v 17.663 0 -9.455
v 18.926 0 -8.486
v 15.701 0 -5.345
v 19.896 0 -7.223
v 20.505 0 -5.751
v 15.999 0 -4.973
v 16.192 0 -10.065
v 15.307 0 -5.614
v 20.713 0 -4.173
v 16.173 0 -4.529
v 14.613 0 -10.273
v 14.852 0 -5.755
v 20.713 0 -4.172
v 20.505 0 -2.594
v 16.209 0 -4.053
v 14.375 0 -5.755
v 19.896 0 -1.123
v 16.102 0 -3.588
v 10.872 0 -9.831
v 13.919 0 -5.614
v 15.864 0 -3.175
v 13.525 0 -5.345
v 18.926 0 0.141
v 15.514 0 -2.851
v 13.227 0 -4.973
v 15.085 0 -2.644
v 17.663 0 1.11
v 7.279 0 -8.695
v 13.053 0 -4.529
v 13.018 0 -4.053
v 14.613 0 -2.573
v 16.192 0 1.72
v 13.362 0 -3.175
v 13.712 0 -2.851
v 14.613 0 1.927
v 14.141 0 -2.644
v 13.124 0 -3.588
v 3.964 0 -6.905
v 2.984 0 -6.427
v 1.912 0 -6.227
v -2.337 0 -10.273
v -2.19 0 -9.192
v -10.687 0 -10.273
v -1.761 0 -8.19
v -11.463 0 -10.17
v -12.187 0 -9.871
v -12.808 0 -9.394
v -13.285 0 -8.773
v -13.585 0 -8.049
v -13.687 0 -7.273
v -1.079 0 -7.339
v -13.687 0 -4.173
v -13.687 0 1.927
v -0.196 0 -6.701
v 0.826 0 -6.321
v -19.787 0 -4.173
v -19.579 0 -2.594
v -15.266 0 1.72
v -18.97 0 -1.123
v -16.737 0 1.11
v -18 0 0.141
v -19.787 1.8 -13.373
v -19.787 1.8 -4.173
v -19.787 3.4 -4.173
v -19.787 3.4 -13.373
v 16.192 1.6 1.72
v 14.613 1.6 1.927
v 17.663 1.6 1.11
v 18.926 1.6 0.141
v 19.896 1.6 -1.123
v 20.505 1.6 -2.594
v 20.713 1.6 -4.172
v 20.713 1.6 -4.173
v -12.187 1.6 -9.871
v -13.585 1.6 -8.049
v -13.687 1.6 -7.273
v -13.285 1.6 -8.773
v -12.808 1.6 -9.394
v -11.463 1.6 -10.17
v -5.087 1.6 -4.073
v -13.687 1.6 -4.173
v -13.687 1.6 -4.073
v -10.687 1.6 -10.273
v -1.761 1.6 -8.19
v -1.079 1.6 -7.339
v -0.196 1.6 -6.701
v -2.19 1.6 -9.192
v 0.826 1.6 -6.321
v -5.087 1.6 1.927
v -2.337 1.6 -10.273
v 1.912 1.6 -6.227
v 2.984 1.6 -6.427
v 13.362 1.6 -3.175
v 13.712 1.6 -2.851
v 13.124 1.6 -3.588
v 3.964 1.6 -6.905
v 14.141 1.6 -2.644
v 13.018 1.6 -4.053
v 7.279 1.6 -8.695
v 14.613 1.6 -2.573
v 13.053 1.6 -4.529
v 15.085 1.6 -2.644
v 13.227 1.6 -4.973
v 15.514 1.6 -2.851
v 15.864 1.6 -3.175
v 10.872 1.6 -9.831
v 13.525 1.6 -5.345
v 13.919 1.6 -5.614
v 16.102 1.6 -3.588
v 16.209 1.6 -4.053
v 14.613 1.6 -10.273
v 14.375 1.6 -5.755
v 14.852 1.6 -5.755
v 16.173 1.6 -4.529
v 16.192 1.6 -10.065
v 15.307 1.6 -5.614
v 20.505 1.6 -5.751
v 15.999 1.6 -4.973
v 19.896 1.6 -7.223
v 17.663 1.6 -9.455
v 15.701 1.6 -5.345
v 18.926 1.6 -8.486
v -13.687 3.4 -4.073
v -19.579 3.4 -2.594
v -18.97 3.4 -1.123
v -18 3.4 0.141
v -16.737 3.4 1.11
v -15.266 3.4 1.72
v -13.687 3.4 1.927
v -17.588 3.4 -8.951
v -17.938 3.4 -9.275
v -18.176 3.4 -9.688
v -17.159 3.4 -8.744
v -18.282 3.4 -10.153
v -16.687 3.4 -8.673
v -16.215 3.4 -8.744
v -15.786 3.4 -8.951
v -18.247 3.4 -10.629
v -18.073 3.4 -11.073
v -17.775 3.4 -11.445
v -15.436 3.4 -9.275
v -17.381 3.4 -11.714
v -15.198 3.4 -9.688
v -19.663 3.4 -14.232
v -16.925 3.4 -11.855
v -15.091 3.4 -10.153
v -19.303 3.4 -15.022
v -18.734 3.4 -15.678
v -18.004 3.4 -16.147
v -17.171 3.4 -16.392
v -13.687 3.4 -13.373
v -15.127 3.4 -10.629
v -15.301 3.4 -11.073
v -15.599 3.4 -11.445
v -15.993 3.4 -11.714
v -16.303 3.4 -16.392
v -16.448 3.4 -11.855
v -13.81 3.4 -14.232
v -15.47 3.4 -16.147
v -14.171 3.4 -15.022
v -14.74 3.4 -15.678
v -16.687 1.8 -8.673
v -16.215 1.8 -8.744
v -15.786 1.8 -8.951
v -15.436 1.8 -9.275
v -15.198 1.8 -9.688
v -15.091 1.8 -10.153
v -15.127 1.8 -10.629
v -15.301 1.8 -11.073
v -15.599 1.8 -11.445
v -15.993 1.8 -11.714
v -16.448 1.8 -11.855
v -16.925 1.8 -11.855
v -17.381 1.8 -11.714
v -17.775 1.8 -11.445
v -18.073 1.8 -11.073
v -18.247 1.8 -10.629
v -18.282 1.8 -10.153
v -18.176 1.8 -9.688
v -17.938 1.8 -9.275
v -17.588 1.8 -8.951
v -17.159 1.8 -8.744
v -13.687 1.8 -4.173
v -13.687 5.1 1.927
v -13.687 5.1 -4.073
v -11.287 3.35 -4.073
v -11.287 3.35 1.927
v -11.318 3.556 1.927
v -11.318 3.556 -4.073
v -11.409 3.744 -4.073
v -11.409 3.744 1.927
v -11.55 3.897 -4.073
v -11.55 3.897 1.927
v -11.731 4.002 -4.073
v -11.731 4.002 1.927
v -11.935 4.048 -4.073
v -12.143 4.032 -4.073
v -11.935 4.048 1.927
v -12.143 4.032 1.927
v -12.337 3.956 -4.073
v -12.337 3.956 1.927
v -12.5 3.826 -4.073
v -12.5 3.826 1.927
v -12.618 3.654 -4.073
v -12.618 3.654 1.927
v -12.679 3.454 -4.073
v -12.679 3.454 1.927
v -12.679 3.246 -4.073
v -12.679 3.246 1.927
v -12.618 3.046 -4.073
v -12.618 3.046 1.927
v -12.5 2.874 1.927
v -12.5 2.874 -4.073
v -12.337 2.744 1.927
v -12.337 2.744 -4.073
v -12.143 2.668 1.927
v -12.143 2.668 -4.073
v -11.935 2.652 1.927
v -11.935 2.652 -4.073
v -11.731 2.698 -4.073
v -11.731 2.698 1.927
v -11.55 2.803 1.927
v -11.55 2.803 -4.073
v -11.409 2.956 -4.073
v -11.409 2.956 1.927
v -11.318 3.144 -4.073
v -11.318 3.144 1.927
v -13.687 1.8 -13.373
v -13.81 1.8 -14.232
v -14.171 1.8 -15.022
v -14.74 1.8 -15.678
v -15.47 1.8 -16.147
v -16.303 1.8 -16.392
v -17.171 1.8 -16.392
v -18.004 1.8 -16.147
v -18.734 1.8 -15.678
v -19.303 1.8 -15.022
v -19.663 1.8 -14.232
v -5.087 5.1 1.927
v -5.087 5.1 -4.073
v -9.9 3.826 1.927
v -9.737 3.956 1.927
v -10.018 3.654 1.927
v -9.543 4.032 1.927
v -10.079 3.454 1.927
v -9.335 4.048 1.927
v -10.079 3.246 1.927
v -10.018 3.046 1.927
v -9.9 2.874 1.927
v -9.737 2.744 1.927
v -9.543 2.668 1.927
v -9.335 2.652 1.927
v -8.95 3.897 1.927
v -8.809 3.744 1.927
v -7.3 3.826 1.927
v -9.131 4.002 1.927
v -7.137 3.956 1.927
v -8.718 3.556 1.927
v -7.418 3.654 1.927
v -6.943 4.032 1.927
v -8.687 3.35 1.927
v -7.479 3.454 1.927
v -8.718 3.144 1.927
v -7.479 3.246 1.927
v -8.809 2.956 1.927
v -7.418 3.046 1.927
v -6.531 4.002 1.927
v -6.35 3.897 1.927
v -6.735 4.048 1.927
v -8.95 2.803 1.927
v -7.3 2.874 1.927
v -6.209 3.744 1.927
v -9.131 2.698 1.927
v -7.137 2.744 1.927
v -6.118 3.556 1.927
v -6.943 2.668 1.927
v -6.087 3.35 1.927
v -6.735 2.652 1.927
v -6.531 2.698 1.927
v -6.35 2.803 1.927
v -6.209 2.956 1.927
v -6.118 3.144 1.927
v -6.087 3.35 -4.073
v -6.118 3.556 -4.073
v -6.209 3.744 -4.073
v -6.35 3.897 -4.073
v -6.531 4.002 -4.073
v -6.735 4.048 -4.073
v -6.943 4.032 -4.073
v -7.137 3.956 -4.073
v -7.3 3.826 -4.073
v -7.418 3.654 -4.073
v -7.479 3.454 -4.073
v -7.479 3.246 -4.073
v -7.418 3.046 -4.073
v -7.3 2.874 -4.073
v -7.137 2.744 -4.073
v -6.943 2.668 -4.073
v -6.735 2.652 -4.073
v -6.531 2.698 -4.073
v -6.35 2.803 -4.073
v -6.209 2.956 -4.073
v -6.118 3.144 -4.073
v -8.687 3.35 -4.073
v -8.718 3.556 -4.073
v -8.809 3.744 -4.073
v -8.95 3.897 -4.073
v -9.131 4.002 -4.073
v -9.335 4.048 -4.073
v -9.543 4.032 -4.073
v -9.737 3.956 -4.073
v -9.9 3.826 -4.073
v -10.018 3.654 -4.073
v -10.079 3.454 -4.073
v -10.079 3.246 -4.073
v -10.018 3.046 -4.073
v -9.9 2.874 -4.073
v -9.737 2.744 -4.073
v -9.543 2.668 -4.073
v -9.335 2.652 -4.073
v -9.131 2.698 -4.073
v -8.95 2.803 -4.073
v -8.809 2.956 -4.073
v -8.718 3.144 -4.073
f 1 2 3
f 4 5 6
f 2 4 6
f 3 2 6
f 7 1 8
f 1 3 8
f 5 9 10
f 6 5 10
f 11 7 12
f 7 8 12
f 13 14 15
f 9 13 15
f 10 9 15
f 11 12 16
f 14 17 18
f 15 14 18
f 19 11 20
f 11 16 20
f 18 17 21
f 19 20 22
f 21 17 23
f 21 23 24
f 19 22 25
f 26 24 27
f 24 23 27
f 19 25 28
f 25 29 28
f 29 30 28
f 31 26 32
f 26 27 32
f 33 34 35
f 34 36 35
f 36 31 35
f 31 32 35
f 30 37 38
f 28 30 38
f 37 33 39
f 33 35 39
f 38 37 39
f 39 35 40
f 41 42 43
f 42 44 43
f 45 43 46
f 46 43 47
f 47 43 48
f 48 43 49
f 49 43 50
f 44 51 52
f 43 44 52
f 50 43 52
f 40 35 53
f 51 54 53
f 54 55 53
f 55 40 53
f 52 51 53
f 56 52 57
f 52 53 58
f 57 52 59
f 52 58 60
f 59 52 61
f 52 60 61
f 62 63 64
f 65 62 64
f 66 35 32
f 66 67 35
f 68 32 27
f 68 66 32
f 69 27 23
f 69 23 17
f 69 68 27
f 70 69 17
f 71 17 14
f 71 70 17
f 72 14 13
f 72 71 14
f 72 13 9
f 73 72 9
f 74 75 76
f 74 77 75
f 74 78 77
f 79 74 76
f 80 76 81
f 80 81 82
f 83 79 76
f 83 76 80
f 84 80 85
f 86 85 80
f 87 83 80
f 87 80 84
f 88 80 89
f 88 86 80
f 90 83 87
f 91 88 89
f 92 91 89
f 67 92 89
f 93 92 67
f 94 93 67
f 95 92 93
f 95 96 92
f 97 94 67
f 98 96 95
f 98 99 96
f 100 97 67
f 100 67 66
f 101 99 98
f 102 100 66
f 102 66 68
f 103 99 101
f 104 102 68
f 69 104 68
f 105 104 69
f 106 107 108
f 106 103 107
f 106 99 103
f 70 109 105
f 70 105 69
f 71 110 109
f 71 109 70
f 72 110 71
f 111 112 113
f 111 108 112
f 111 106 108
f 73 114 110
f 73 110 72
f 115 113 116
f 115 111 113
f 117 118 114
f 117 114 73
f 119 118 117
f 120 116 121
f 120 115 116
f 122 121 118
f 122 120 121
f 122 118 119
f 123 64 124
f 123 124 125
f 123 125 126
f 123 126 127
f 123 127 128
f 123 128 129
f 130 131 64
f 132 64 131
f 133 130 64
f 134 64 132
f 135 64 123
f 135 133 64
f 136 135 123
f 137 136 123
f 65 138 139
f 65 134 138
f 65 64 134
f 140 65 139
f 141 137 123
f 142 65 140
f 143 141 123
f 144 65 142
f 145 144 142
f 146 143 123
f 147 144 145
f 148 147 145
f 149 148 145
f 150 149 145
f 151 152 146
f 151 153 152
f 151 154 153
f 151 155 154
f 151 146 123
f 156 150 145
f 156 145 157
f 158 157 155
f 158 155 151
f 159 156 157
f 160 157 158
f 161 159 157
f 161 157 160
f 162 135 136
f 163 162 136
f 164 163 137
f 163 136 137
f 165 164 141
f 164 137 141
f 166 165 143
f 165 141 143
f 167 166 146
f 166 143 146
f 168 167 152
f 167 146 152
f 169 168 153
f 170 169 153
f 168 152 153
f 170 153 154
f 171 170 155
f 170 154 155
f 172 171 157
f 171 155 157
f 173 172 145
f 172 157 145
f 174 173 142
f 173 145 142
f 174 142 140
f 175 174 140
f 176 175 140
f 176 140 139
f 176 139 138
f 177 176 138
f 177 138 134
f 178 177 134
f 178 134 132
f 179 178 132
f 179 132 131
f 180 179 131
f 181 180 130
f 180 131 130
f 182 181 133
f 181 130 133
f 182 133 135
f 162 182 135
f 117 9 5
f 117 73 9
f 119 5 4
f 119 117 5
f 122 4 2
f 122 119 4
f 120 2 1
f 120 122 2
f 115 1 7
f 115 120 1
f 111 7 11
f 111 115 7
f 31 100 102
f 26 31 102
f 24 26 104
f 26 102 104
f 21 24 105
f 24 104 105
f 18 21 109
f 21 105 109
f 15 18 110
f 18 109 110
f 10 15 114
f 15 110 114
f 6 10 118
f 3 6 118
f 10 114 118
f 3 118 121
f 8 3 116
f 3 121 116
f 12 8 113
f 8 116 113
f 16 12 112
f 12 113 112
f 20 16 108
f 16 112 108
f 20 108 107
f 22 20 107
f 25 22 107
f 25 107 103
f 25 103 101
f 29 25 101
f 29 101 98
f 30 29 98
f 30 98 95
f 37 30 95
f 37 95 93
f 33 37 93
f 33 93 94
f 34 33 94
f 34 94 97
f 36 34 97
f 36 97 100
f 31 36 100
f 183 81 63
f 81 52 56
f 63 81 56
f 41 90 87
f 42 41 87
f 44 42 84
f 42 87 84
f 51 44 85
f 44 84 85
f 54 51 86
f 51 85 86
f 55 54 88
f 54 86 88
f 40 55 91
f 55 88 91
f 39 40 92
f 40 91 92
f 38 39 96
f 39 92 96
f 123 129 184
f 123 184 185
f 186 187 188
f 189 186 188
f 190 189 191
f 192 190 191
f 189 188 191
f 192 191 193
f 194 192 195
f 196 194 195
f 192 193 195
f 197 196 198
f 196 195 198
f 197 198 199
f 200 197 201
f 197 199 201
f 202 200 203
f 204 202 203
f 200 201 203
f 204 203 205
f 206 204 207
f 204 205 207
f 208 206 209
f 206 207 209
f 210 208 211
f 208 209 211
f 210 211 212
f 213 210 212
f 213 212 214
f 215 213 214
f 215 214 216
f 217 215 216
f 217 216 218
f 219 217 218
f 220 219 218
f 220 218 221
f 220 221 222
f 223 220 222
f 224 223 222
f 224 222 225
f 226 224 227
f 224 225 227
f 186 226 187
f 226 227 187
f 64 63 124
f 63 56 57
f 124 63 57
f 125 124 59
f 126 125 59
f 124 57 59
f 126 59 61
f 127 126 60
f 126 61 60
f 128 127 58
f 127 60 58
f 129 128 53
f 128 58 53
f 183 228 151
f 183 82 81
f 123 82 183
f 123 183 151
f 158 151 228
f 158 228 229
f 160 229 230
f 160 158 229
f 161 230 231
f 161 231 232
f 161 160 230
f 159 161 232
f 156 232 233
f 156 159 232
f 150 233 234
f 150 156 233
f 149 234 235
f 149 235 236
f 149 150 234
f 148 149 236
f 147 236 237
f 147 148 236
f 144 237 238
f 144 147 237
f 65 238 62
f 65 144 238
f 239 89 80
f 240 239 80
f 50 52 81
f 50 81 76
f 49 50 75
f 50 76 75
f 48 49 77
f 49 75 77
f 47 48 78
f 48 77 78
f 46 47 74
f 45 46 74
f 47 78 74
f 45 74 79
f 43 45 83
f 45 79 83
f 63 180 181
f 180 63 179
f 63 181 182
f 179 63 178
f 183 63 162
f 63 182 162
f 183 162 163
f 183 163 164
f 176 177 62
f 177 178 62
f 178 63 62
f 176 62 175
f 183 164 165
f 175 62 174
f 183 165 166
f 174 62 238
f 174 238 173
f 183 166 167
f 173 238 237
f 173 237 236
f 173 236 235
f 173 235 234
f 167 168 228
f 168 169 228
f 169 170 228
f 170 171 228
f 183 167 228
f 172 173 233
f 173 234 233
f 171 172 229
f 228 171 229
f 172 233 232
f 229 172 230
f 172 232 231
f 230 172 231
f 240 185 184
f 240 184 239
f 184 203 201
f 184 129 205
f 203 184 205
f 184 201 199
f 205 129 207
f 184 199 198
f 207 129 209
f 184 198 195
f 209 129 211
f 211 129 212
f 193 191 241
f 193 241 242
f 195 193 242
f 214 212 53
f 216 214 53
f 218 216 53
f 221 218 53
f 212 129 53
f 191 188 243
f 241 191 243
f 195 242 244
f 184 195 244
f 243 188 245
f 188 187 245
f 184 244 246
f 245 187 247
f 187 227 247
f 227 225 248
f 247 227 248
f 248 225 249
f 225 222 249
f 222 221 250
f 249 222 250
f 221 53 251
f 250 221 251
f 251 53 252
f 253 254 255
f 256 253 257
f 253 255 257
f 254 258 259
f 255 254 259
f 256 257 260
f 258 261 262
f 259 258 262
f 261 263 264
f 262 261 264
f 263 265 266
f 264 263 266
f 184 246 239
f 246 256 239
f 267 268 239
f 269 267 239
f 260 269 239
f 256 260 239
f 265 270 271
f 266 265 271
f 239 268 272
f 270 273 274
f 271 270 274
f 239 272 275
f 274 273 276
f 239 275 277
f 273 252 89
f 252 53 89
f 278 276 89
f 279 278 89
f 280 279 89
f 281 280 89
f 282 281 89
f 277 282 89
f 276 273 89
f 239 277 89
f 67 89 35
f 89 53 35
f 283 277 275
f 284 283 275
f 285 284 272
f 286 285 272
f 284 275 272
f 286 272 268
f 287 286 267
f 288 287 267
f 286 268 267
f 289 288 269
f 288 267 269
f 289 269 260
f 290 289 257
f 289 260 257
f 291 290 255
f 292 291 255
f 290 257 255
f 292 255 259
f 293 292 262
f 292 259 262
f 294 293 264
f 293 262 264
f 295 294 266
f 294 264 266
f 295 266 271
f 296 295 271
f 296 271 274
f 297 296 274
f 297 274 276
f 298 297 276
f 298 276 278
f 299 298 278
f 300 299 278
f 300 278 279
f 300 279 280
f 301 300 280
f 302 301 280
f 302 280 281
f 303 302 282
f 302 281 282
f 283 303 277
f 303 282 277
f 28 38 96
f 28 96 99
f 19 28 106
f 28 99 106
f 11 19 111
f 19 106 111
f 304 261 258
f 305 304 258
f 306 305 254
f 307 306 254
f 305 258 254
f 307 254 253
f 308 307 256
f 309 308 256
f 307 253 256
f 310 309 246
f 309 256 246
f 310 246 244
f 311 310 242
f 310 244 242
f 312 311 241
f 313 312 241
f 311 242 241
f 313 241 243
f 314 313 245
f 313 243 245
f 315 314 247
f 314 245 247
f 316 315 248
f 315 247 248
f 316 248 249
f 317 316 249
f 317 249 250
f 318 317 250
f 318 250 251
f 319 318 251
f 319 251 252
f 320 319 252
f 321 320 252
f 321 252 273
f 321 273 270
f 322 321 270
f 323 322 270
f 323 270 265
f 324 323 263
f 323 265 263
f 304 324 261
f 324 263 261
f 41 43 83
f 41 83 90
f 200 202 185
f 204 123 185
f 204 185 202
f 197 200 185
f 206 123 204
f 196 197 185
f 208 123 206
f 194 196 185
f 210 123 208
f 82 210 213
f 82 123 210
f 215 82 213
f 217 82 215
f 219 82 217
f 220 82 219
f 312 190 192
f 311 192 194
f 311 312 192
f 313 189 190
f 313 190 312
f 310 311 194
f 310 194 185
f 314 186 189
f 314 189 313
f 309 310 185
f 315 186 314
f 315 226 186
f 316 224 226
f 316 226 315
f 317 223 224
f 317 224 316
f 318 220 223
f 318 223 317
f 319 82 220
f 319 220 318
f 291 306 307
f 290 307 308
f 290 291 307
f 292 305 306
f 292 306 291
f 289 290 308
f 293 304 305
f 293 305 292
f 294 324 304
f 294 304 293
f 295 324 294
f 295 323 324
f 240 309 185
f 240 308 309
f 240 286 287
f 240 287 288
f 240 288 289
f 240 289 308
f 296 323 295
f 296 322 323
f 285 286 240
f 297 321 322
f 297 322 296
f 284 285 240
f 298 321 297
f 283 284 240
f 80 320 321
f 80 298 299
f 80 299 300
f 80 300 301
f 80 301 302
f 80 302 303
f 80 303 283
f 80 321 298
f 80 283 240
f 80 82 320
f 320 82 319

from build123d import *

# Parameters (mm, degrees)
SKETCH1_W           = 34.4
SKETCH1_H           = 12.2
BOSS_EXTRUDE1_DEPTH = 1.6
SKETCH8_R           = 1.6
CUT_EXTRUDE3_DEPTH  = 24.175783188
FILLET2_R           = 3
FILLET3_R           = 6.1
SKETCH2_W           = 8.6
SKETCH2_H           = 6
BOSS_EXTRUDE2_DEPTH = 3.5
SKETCH3_R           = 0.7
CUT_EXTRUDE1_DEPTH  = 6
BOSS_EXTRUDE3_DEPTH = 3.4
SKETCH5_W           = 6.1
SKETCH5_H           = 1.6
BOSS_EXTRUDE4_DEPTH = 9.2
BOSS_EXTRUDE5_DEPTH = 1.6
SKETCH7_R           = 1.6
CUT_EXTRUDE2_DEPTH  = 1.6
FILLET1_R           = 20


# Some blends are built 0.0001 mm under size
with BuildPart() as part:
    # Sketch1 → Boss-Extrude1 (new body)
    with BuildSketch(Plane(origin=(0, 0, 0), x_dir=(1, 0, 0), z_dir=(0, 1, 0))):
        with Locations((3.513069909, 4.172568389)):
            Rectangle(SKETCH1_W, SKETCH1_H)
    extrude(amount=BOSS_EXTRUDE1_DEPTH)

    # Sketch8 → Cut-Extrude3 (cut, through all)
    with BuildSketch(Plane(origin=(0, 1.6, 0), x_dir=(1, 0, 0), z_dir=(0, 1, 0))):
        with Locations(Location((14.613069909, 4.172568389, 0), (0, 0, 270))):
            Circle(SKETCH8_R)
        with BuildLine():
            Line((5.763069909, 10.272568389), (-2.336930091, 10.272568389))
            ThreePointArc((-2.336930091, 10.272568389), (1.713069909, 6.222568389), (5.763069909, 10.272568389))
        make_face()
    extrude(amount=-CUT_EXTRUDE3_DEPTH, mode=Mode.SUBTRACT)

    # Fillet2
    fillet2_edges = [part.edges().sort_by_distance(p)[0] for p in [
        (-13.686930091, 0.8, -10.272568389),
    ]]
    fillet(fillet2_edges, radius=FILLET2_R)

    # Fillet3
    fillet3_edges = [part.edges().sort_by_distance(p)[0] for p in [
        (20.713069909, 0.8, 1.927431611),
        (20.713069909, 0.8, -10.272568389),
    ]]
    fillet(fillet3_edges, radius=FILLET3_R - 0.0001)  # a hair under: the kernel refuses the full size

    # Sketch2 → Boss-Extrude2 (add)
    with BuildSketch(Plane(origin=(0, 1.6, 0), x_dir=(1, 0, 0), z_dir=(0, 1, 0))):
        with Locations((-9.386930091, 1.072568389)):
            Rectangle(SKETCH2_W, SKETCH2_H)
    extrude(amount=BOSS_EXTRUDE2_DEPTH)

    # Sketch3 → Cut-Extrude1 (cut)
    with BuildSketch(Plane.XY.offset(1.927431611)):
        with Locations((-11.986930091, 3.35)):
            Circle(SKETCH3_R)
        with Locations((-6.786930091, 3.35)):
            Circle(SKETCH3_R)
        with Locations((-9.386930091, 3.35)):
            Circle(SKETCH3_R)
    extrude(amount=-CUT_EXTRUDE1_DEPTH, mode=Mode.SUBTRACT)



with BuildPart() as body_2:
    # Sketch4 → Boss-Extrude3 (new body)
    with BuildSketch(Plane.XZ):
        with BuildLine():
            Line((-13.686930091, 1.927431611), (-13.686930091, -4.172568389))
            Line((-13.686930091, -4.172568389), (-19.786930091, -4.172568389))
            ThreePointArc((-19.786930091, -4.172568389), (-18.000281456, 0.140782976), (-13.686930091, 1.927431611))
        make_face()
    extrude(amount=-BOSS_EXTRUDE3_DEPTH)


with BuildPart() as part_1:
    add(part.part)

    add(body_2.part)  # Boss-Extrude4 merges body 2
    # Sketch5 → Boss-Extrude4 (add)
    with BuildSketch(Plane(origin=(0, 0, -4.172568389), x_dir=(-1, 0, 0), z_dir=(0, 0, -1))):
        with Locations((16.736930091, 2.6)):
            Rectangle(SKETCH5_W, SKETCH5_H)
    extrude(amount=BOSS_EXTRUDE4_DEPTH)

    # Sketch6 → Boss-Extrude5 (add)
    with BuildSketch(Plane(origin=(0, 3.4, 0), x_dir=(1, 0, 0), z_dir=(0, 1, 0))):
        with BuildLine():
            Line((-19.786930091, 13.372568389), (-13.686930091, 13.372568389))
            ThreePointArc((-13.686930091, 13.372568389), (-16.736930091, 16.422568389), (-19.786930091, 13.372568389))
        make_face()
    extrude(amount=-BOSS_EXTRUDE5_DEPTH)

    # Sketch7 → Cut-Extrude2 (cut)
    with BuildSketch(Plane(origin=(0, 3.4, 0), x_dir=(1, 0, 0), z_dir=(0, 1, 0))):
        with Locations(Location((-16.686930091, 10.272568389, 0), (0, 0, 270))):
            Circle(SKETCH7_R)
    extrude(amount=-CUT_EXTRUDE2_DEPTH, mode=Mode.SUBTRACT)

    # Fillet1
    # the kernel refuses this fillet: 20 mm, written as the material it takes off along each edge
    with BuildSketch(Plane(origin=(5.763069909, 23.72525, -10.272568389), x_dir=(-0.47132268480502076, 0, 0.8819608419811998), z_dir=(0, -1, 0))) as fillet1_piece_1:
        with BuildLine():
            CenterArc((13.244167443, -17.63921684), FILLET1_R, 118.12018917, 32.428171428)
            Line((-4.171252893, -7.805441648), (-4.5195613, -7.608766144))
            ThreePointArc((-4.5195613, -7.608766144), (-2.438410783, -3.71419175), (-0.352784337, 0.188529074))
            Line((-0.352784337, 0.188529074), (0.188529074, 0.352784337))
            ThreePointArc((0.188529074, 0.352784337), (1.908856873, -0.07805859), (3.629184673, 0.352784337))
            Line((3.629184673, 0.352784337), (3.817713747, 0))
        make_face()
    extrude(amount=45.8505, mode=Mode.SUBTRACT)


solid = part_1.part
